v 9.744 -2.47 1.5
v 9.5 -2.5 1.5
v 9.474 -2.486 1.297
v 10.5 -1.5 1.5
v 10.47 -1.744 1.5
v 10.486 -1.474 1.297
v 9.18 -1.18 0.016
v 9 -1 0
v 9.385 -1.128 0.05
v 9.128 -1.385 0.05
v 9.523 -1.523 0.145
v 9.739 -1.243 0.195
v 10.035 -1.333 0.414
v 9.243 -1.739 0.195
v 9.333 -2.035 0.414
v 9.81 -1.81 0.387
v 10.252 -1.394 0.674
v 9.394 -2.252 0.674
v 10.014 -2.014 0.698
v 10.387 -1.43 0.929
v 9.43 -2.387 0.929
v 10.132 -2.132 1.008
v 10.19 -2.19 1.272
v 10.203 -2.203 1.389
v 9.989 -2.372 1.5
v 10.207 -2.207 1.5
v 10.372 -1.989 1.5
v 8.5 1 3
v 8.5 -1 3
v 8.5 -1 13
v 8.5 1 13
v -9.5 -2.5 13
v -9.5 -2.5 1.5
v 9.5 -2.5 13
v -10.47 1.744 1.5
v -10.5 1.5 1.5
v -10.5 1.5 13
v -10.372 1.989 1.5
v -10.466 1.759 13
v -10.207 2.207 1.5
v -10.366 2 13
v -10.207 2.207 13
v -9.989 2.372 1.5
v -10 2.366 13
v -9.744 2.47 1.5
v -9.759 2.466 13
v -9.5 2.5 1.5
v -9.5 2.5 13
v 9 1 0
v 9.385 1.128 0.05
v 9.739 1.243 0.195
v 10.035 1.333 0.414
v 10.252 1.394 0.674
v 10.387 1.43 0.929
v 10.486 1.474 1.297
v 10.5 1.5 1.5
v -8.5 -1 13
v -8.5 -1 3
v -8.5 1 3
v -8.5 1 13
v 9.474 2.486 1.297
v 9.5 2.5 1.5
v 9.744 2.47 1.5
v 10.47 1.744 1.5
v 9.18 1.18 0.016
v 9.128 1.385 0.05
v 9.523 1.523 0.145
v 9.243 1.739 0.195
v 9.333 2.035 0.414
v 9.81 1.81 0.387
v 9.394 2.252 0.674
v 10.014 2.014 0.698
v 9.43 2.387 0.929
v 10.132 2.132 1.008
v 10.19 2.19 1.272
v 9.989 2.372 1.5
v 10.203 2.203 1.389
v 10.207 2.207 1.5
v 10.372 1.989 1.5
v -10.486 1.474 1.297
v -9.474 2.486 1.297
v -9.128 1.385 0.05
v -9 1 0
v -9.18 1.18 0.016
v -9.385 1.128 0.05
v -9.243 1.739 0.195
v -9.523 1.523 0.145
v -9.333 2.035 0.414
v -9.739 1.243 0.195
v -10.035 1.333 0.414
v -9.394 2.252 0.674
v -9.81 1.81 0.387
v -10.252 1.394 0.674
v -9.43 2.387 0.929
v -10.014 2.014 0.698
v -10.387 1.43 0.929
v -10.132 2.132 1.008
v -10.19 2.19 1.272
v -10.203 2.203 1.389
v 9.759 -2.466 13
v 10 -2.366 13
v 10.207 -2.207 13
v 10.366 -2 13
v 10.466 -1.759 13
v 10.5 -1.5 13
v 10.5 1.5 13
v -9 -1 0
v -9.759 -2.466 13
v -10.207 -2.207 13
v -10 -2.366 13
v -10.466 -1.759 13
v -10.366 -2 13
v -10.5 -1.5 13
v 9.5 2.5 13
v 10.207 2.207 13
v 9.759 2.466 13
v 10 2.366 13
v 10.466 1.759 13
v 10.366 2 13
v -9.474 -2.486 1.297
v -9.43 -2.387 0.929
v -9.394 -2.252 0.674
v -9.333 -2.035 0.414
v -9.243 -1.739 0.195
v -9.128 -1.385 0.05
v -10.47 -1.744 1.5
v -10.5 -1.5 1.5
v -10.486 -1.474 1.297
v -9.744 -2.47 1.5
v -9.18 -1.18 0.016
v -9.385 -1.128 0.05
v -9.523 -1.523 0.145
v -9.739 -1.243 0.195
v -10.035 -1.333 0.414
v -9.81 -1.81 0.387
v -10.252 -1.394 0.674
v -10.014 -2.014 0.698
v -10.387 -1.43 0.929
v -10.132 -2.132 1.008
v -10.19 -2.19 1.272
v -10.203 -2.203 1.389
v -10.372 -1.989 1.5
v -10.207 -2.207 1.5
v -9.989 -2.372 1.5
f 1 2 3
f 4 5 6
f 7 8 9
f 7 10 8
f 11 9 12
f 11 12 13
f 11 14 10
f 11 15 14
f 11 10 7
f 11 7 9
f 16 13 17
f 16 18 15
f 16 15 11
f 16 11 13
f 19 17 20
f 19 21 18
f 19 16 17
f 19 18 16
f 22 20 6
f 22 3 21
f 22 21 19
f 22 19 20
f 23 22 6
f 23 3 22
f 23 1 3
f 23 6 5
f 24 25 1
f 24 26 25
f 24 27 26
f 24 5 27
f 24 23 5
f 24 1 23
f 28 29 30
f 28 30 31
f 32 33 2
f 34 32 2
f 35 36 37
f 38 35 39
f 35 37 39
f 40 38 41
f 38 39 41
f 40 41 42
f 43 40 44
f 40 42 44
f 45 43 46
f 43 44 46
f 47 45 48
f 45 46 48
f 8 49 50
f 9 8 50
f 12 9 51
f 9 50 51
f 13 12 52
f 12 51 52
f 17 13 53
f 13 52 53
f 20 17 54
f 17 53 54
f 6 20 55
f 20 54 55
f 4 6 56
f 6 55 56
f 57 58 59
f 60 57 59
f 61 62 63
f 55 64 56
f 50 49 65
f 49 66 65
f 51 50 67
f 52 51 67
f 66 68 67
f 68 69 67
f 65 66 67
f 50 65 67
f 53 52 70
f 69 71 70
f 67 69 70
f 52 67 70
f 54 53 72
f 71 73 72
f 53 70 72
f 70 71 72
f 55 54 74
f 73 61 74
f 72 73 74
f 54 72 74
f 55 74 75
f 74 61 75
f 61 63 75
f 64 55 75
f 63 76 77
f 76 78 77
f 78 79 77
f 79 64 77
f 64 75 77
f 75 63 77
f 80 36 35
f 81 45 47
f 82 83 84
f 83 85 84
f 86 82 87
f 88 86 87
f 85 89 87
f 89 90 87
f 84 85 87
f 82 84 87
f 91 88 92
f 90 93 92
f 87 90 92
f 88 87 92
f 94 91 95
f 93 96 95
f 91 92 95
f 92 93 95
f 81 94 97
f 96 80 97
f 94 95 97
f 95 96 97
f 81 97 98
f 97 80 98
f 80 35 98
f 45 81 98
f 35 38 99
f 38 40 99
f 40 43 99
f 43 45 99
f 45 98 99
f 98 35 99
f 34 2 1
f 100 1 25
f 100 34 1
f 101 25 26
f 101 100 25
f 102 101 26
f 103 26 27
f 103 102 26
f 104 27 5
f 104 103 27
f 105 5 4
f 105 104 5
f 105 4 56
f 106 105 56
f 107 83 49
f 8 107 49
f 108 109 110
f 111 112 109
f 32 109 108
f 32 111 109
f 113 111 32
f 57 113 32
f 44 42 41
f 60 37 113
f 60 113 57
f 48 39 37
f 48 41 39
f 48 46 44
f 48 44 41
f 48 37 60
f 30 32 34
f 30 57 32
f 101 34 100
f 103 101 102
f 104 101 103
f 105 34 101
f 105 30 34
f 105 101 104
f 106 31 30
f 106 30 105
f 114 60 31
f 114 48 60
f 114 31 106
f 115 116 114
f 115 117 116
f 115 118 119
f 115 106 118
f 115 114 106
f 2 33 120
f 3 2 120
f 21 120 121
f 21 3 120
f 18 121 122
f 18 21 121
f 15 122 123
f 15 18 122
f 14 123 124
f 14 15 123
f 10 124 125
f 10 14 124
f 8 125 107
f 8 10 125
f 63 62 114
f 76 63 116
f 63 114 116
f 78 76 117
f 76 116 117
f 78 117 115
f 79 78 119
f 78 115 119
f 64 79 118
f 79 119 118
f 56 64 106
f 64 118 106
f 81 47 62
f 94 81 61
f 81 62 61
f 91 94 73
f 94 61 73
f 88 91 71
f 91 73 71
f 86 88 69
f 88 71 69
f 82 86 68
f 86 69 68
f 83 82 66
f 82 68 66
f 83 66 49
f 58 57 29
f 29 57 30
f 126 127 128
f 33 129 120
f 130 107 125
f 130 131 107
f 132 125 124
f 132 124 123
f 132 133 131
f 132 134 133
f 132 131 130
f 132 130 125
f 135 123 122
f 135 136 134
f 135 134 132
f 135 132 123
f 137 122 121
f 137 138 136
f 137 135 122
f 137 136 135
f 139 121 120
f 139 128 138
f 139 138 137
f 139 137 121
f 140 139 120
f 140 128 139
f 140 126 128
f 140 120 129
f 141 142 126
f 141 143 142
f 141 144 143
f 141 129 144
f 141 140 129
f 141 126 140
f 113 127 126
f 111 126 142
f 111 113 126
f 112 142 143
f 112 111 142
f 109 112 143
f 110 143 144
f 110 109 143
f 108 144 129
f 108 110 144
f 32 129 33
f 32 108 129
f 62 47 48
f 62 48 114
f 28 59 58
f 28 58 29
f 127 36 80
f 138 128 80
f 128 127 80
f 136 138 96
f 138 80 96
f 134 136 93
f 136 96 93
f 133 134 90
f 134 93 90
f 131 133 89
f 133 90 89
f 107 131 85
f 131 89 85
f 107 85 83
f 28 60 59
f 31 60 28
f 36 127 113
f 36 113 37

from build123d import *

# Parameters (mm, degrees)
SKETCH_W     = 21
SKETCH_H     = 5
PAD_DEPTH    = 13
SKETCH001_W  = 17
SKETCH001_H  = 2
POCKET_DEPTH = 10
FILLET_R     = 1.5
FILLET001_R  = 1


with BuildPart() as part:
    # Sketch → Pad (new body)
    with BuildSketch(Plane.XY):
        Rectangle(SKETCH_W, SKETCH_H)
    extrude(amount=PAD_DEPTH)

    # Sketch001 (on Face6 of Pad) → Pocket (cut)
    with BuildSketch(Plane.XY.offset(13)):
        Rectangle(SKETCH001_W, SKETCH001_H)
    extrude(amount=-POCKET_DEPTH, mode=Mode.SUBTRACT)

    # Fillet
    fillet_edges = [part.edges().sort_by_distance(p)[0] for p in [
        (0, 2.5, 0),
        (0, -2.5, 0),
        (10.5, 0, 0),
        (-10.5, 0, 0),
    ]]
    fillet(fillet_edges, radius=FILLET_R)

    # Fillet001
    fillet001_edges = [part.edges().sort_by_distance(p)[0] for p in [
        (-10.5, 2.5, 7.25),
        (-10.5, -2.5, 7.25),
        (10.5, 2.5, 7.25),
        (10.5, -2.5, 7.25),
    ]]
    fillet(fillet001_edges, radius=FILLET001_R)


solid = part.part
